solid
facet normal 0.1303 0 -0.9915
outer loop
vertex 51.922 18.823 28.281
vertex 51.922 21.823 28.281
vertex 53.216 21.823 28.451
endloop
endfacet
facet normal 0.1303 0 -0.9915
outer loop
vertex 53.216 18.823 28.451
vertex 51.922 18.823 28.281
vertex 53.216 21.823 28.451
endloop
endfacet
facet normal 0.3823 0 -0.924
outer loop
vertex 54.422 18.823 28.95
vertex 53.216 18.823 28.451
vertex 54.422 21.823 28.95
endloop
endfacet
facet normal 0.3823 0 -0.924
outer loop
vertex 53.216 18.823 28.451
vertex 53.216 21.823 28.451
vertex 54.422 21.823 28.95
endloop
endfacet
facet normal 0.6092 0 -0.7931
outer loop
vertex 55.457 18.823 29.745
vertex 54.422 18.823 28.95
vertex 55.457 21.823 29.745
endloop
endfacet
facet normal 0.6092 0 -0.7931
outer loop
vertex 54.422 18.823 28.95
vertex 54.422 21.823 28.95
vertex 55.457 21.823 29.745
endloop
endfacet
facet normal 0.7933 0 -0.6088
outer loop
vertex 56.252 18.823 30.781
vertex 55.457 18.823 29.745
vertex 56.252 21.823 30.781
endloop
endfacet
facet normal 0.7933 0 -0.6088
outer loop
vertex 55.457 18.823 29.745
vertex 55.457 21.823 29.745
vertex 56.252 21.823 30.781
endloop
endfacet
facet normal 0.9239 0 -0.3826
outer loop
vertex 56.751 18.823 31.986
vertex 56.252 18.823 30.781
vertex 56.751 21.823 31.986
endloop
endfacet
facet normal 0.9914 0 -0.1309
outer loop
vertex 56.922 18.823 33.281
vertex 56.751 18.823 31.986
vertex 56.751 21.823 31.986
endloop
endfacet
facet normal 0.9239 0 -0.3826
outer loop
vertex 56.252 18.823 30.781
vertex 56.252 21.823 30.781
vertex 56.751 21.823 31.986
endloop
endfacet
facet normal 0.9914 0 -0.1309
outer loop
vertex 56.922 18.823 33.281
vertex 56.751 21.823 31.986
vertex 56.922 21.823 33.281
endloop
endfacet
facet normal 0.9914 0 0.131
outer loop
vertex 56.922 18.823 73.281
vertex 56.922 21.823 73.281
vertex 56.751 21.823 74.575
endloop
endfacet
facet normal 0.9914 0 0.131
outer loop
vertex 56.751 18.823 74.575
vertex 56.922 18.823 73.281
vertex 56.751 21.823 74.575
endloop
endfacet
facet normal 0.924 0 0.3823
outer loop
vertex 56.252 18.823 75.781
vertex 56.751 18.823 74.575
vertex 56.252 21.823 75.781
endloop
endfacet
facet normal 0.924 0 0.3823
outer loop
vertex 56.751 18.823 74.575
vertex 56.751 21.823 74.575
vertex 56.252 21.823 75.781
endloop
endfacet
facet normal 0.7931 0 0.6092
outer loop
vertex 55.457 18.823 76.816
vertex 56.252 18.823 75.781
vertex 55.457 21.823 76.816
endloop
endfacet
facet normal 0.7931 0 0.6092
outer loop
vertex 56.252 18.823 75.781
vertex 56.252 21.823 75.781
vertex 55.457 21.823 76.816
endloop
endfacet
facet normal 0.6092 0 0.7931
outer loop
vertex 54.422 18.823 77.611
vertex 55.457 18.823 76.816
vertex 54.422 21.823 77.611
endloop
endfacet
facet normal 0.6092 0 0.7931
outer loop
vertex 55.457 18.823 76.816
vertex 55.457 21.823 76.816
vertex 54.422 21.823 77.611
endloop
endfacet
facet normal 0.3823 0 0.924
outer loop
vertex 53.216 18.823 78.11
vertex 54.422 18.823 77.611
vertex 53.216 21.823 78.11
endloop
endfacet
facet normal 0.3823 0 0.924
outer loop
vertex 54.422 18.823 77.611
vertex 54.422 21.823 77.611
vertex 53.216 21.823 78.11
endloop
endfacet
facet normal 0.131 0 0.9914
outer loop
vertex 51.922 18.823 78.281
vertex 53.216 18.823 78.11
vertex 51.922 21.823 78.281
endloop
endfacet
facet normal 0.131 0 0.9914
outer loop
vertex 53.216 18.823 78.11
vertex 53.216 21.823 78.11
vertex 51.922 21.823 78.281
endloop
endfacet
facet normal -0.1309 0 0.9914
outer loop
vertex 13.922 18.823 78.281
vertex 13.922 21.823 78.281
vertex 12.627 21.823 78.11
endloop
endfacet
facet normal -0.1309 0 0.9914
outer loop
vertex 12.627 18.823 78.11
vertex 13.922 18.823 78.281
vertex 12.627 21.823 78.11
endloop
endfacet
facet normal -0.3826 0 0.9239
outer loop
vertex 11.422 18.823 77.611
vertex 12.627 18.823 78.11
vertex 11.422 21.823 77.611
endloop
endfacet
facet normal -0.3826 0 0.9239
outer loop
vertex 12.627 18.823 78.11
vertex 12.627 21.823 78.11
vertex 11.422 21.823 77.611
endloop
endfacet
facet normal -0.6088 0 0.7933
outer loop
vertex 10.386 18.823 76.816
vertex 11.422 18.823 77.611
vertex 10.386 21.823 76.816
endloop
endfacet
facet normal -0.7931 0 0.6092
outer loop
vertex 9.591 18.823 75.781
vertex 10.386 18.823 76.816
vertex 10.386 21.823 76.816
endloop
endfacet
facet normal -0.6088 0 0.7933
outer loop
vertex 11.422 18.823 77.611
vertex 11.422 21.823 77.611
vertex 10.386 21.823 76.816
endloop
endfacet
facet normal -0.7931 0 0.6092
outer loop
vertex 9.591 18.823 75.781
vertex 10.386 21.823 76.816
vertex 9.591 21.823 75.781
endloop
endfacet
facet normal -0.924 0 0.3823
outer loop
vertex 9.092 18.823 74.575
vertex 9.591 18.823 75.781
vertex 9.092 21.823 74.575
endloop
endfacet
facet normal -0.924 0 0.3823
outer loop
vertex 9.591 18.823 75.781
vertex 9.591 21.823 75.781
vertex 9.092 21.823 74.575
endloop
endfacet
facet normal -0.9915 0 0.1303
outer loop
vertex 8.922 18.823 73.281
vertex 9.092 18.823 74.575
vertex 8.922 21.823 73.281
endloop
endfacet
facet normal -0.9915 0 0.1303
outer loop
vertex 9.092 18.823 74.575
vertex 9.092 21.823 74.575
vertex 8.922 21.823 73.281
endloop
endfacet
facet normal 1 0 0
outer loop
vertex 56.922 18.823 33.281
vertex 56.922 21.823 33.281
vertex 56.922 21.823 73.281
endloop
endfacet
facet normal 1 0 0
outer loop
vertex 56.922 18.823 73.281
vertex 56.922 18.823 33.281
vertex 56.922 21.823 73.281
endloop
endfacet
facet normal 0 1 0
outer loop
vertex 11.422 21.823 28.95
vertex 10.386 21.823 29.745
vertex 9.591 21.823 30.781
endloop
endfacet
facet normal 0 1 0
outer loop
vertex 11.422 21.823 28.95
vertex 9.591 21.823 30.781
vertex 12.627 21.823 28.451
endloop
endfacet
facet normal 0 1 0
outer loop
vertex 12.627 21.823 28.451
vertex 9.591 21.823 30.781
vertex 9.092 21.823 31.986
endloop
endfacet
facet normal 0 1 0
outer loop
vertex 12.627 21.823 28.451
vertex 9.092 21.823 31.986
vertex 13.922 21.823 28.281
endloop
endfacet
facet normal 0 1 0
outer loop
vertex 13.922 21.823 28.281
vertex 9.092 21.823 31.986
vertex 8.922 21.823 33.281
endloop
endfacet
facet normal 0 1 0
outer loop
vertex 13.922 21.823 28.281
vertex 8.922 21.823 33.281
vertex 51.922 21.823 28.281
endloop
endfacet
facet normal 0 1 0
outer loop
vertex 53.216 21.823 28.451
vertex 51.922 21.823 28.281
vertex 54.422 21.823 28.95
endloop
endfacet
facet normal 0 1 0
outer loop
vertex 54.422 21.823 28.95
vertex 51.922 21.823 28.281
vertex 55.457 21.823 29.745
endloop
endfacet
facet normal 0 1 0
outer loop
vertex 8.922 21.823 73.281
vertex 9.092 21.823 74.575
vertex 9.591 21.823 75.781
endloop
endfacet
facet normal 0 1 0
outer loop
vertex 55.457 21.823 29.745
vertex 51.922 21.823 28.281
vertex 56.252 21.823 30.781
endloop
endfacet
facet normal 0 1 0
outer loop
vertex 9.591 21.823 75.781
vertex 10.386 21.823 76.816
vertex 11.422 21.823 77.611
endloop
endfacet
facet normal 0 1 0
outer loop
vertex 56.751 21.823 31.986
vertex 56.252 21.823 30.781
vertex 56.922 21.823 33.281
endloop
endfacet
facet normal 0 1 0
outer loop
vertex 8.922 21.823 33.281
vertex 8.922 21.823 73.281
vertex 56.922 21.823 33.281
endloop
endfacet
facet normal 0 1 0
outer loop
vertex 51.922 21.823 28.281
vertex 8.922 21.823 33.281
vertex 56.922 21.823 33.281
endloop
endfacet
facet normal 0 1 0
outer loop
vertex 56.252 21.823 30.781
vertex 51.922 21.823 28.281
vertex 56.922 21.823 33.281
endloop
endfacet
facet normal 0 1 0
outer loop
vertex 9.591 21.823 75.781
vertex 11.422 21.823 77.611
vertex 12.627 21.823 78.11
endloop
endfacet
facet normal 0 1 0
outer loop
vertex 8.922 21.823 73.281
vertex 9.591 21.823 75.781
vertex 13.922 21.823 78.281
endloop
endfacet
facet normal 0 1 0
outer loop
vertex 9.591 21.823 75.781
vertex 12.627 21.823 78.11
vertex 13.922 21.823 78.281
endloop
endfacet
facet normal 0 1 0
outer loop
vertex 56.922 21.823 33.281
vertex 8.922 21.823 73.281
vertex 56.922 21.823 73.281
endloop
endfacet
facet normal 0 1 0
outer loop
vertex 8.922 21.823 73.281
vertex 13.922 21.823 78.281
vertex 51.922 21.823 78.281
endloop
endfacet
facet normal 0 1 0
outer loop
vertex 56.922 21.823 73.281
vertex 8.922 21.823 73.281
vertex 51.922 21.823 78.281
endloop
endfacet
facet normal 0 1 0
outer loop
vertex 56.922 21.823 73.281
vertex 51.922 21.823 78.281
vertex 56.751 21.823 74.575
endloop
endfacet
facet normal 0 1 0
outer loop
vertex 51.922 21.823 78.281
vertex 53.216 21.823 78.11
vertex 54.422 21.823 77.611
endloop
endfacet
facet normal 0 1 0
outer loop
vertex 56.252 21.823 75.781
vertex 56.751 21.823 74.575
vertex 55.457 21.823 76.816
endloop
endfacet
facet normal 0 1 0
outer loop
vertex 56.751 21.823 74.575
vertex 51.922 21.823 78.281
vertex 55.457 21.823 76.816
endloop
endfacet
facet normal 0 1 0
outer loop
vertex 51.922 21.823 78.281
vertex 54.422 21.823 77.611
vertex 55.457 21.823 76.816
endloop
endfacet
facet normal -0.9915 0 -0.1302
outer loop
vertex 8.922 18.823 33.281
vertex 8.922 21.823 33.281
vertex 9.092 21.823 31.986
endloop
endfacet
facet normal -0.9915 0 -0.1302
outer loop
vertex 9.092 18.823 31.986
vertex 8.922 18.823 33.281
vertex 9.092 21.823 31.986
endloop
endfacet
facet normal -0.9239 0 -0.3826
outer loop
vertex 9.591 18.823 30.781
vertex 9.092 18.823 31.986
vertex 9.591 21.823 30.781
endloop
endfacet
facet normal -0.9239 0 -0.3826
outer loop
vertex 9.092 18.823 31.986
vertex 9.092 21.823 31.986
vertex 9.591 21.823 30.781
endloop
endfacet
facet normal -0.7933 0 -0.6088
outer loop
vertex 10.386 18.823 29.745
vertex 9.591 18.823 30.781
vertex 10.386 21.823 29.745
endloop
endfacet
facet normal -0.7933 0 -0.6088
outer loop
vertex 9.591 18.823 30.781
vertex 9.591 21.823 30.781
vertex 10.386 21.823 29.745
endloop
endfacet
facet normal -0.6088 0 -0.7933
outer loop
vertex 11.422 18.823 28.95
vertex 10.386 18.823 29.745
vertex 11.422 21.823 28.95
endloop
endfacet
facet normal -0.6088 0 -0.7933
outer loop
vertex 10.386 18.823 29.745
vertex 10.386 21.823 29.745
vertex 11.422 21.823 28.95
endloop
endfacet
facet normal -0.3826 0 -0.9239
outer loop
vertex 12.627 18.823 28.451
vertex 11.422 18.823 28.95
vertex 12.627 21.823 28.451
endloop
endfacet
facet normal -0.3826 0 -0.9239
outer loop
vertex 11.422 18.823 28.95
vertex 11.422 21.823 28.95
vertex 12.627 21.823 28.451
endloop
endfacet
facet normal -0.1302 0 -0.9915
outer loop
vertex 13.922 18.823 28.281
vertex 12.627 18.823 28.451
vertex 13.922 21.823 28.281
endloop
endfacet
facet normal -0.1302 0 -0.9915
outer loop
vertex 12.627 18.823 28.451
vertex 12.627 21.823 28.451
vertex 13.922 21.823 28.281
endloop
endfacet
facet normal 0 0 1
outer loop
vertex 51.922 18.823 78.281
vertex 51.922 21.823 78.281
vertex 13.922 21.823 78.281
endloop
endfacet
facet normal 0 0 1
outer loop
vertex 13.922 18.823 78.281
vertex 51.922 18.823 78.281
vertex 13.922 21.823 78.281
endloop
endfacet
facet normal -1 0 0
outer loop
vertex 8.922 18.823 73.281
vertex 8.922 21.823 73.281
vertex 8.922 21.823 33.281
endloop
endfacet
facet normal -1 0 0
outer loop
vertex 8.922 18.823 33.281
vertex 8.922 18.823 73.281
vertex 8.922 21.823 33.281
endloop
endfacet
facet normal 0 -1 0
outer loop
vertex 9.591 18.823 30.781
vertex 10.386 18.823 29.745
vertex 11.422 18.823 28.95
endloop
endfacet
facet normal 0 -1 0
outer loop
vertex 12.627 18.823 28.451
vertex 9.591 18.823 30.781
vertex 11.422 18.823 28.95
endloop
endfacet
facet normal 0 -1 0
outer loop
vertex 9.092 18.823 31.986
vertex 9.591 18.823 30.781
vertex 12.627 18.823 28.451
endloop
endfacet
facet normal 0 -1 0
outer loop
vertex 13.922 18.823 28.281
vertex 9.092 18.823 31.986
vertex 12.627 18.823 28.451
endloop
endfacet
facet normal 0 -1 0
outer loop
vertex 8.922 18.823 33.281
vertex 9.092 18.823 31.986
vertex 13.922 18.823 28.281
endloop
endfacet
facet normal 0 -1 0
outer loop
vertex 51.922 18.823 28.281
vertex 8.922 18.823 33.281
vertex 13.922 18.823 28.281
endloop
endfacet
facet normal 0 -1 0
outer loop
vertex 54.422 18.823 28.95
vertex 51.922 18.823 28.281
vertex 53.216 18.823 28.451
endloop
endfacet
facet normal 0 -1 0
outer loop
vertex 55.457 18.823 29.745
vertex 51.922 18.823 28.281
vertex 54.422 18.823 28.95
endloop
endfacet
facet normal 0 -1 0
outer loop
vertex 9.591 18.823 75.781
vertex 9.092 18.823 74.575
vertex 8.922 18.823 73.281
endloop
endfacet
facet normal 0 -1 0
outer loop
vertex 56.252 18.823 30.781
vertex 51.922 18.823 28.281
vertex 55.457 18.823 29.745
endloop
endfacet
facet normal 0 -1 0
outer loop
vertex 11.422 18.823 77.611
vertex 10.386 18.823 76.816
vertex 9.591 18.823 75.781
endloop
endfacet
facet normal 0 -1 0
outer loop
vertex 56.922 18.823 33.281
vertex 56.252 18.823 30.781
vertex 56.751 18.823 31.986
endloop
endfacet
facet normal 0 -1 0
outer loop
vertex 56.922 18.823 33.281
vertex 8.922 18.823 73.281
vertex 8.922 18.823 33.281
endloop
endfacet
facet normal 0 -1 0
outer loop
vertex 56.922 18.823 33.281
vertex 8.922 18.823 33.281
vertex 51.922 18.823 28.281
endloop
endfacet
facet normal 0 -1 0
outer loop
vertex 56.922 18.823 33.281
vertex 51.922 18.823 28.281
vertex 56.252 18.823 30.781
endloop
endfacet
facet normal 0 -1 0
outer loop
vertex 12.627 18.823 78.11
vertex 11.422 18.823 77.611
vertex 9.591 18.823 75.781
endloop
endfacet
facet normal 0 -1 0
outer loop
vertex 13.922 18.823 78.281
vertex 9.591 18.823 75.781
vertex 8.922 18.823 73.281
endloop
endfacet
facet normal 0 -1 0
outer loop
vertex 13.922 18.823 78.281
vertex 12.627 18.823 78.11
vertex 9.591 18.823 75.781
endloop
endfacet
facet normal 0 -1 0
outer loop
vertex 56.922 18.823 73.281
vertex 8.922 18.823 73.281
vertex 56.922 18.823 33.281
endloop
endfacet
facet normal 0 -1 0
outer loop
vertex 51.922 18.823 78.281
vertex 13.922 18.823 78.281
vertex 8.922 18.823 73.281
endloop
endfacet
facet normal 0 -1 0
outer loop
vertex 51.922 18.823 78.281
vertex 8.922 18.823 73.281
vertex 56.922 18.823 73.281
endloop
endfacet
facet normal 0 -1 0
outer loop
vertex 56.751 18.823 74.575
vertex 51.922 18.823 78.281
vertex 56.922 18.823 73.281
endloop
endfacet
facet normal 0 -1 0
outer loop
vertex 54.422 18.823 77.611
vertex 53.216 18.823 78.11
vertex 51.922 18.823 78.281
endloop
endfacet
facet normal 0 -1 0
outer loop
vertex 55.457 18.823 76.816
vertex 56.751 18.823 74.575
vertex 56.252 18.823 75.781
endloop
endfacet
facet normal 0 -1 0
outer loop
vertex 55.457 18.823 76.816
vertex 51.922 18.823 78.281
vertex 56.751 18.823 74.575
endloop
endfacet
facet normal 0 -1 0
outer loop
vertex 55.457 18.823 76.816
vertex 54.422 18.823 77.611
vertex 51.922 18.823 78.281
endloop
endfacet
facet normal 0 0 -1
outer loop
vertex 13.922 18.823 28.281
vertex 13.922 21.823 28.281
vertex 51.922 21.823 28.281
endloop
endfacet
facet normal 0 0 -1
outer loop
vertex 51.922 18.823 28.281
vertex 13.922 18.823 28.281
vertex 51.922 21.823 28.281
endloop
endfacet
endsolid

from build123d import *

# Parameters (mm, degrees)
BOSS_EXTRUDE1_DEPTH = 3


with BuildPart() as part:
    # Sketch1 → Boss-Extrude1 (new body)
    with BuildSketch(Plane.XZ.offset(-21.823289438)):
        with BuildLine():
            Line((13.921525611, 28.280531955), (51.921525611, 28.280531955))
            ThreePointArc((51.921525611, 28.280531955), (55.457059517, 29.744998049), (56.921525611, 33.280531955))
            Line((56.921525611, 33.280531955), (56.921525611, 73.280531955))
            ThreePointArc((56.921525611, 73.280531955), (55.457059517, 76.816065861), (51.921525611, 78.280531955))
            Line((51.921525611, 78.280531955), (13.921525611, 78.280531955))
            ThreePointArc((13.921525611, 78.280531955), (10.385991705, 76.816065861), (8.921525611, 73.280531955))
            Line((8.921525611, 73.280531955), (8.921525611, 33.280531955))
            ThreePointArc((8.921525611, 33.280531955), (10.385991705, 29.744998049), (13.921525611, 28.280531955))
        make_face()
    extrude(amount=BOSS_EXTRUDE1_DEPTH)


solid = part.part
